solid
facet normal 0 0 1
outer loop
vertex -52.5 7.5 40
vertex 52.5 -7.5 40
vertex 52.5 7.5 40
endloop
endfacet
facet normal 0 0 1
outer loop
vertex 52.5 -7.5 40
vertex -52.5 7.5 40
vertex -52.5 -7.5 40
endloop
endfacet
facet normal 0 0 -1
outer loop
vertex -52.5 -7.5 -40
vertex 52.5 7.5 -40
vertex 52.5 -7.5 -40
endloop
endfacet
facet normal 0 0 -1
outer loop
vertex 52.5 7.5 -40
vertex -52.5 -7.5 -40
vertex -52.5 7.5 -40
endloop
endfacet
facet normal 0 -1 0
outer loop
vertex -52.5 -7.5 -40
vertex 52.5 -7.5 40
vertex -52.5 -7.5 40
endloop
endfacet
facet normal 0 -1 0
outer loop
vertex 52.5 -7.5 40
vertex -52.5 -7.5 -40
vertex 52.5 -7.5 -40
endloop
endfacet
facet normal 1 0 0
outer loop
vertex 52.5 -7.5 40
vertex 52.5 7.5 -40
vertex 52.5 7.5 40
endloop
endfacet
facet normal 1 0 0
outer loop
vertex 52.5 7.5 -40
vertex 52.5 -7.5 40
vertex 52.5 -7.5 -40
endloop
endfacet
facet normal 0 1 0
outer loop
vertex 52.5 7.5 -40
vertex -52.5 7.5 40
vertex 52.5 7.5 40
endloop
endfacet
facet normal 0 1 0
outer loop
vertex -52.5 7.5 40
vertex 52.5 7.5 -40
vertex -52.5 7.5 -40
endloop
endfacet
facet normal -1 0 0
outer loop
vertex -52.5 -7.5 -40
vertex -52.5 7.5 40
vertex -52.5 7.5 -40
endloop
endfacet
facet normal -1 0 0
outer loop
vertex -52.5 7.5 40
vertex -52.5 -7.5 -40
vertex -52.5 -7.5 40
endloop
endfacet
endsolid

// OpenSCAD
// ========================================
// a 105 x 15 x 80 mm box
// NeuroCAD canonical IR; dimensions are millimetres
// ========================================
$fn = 48;

cube(size=[105, 15, 80], center=true);
